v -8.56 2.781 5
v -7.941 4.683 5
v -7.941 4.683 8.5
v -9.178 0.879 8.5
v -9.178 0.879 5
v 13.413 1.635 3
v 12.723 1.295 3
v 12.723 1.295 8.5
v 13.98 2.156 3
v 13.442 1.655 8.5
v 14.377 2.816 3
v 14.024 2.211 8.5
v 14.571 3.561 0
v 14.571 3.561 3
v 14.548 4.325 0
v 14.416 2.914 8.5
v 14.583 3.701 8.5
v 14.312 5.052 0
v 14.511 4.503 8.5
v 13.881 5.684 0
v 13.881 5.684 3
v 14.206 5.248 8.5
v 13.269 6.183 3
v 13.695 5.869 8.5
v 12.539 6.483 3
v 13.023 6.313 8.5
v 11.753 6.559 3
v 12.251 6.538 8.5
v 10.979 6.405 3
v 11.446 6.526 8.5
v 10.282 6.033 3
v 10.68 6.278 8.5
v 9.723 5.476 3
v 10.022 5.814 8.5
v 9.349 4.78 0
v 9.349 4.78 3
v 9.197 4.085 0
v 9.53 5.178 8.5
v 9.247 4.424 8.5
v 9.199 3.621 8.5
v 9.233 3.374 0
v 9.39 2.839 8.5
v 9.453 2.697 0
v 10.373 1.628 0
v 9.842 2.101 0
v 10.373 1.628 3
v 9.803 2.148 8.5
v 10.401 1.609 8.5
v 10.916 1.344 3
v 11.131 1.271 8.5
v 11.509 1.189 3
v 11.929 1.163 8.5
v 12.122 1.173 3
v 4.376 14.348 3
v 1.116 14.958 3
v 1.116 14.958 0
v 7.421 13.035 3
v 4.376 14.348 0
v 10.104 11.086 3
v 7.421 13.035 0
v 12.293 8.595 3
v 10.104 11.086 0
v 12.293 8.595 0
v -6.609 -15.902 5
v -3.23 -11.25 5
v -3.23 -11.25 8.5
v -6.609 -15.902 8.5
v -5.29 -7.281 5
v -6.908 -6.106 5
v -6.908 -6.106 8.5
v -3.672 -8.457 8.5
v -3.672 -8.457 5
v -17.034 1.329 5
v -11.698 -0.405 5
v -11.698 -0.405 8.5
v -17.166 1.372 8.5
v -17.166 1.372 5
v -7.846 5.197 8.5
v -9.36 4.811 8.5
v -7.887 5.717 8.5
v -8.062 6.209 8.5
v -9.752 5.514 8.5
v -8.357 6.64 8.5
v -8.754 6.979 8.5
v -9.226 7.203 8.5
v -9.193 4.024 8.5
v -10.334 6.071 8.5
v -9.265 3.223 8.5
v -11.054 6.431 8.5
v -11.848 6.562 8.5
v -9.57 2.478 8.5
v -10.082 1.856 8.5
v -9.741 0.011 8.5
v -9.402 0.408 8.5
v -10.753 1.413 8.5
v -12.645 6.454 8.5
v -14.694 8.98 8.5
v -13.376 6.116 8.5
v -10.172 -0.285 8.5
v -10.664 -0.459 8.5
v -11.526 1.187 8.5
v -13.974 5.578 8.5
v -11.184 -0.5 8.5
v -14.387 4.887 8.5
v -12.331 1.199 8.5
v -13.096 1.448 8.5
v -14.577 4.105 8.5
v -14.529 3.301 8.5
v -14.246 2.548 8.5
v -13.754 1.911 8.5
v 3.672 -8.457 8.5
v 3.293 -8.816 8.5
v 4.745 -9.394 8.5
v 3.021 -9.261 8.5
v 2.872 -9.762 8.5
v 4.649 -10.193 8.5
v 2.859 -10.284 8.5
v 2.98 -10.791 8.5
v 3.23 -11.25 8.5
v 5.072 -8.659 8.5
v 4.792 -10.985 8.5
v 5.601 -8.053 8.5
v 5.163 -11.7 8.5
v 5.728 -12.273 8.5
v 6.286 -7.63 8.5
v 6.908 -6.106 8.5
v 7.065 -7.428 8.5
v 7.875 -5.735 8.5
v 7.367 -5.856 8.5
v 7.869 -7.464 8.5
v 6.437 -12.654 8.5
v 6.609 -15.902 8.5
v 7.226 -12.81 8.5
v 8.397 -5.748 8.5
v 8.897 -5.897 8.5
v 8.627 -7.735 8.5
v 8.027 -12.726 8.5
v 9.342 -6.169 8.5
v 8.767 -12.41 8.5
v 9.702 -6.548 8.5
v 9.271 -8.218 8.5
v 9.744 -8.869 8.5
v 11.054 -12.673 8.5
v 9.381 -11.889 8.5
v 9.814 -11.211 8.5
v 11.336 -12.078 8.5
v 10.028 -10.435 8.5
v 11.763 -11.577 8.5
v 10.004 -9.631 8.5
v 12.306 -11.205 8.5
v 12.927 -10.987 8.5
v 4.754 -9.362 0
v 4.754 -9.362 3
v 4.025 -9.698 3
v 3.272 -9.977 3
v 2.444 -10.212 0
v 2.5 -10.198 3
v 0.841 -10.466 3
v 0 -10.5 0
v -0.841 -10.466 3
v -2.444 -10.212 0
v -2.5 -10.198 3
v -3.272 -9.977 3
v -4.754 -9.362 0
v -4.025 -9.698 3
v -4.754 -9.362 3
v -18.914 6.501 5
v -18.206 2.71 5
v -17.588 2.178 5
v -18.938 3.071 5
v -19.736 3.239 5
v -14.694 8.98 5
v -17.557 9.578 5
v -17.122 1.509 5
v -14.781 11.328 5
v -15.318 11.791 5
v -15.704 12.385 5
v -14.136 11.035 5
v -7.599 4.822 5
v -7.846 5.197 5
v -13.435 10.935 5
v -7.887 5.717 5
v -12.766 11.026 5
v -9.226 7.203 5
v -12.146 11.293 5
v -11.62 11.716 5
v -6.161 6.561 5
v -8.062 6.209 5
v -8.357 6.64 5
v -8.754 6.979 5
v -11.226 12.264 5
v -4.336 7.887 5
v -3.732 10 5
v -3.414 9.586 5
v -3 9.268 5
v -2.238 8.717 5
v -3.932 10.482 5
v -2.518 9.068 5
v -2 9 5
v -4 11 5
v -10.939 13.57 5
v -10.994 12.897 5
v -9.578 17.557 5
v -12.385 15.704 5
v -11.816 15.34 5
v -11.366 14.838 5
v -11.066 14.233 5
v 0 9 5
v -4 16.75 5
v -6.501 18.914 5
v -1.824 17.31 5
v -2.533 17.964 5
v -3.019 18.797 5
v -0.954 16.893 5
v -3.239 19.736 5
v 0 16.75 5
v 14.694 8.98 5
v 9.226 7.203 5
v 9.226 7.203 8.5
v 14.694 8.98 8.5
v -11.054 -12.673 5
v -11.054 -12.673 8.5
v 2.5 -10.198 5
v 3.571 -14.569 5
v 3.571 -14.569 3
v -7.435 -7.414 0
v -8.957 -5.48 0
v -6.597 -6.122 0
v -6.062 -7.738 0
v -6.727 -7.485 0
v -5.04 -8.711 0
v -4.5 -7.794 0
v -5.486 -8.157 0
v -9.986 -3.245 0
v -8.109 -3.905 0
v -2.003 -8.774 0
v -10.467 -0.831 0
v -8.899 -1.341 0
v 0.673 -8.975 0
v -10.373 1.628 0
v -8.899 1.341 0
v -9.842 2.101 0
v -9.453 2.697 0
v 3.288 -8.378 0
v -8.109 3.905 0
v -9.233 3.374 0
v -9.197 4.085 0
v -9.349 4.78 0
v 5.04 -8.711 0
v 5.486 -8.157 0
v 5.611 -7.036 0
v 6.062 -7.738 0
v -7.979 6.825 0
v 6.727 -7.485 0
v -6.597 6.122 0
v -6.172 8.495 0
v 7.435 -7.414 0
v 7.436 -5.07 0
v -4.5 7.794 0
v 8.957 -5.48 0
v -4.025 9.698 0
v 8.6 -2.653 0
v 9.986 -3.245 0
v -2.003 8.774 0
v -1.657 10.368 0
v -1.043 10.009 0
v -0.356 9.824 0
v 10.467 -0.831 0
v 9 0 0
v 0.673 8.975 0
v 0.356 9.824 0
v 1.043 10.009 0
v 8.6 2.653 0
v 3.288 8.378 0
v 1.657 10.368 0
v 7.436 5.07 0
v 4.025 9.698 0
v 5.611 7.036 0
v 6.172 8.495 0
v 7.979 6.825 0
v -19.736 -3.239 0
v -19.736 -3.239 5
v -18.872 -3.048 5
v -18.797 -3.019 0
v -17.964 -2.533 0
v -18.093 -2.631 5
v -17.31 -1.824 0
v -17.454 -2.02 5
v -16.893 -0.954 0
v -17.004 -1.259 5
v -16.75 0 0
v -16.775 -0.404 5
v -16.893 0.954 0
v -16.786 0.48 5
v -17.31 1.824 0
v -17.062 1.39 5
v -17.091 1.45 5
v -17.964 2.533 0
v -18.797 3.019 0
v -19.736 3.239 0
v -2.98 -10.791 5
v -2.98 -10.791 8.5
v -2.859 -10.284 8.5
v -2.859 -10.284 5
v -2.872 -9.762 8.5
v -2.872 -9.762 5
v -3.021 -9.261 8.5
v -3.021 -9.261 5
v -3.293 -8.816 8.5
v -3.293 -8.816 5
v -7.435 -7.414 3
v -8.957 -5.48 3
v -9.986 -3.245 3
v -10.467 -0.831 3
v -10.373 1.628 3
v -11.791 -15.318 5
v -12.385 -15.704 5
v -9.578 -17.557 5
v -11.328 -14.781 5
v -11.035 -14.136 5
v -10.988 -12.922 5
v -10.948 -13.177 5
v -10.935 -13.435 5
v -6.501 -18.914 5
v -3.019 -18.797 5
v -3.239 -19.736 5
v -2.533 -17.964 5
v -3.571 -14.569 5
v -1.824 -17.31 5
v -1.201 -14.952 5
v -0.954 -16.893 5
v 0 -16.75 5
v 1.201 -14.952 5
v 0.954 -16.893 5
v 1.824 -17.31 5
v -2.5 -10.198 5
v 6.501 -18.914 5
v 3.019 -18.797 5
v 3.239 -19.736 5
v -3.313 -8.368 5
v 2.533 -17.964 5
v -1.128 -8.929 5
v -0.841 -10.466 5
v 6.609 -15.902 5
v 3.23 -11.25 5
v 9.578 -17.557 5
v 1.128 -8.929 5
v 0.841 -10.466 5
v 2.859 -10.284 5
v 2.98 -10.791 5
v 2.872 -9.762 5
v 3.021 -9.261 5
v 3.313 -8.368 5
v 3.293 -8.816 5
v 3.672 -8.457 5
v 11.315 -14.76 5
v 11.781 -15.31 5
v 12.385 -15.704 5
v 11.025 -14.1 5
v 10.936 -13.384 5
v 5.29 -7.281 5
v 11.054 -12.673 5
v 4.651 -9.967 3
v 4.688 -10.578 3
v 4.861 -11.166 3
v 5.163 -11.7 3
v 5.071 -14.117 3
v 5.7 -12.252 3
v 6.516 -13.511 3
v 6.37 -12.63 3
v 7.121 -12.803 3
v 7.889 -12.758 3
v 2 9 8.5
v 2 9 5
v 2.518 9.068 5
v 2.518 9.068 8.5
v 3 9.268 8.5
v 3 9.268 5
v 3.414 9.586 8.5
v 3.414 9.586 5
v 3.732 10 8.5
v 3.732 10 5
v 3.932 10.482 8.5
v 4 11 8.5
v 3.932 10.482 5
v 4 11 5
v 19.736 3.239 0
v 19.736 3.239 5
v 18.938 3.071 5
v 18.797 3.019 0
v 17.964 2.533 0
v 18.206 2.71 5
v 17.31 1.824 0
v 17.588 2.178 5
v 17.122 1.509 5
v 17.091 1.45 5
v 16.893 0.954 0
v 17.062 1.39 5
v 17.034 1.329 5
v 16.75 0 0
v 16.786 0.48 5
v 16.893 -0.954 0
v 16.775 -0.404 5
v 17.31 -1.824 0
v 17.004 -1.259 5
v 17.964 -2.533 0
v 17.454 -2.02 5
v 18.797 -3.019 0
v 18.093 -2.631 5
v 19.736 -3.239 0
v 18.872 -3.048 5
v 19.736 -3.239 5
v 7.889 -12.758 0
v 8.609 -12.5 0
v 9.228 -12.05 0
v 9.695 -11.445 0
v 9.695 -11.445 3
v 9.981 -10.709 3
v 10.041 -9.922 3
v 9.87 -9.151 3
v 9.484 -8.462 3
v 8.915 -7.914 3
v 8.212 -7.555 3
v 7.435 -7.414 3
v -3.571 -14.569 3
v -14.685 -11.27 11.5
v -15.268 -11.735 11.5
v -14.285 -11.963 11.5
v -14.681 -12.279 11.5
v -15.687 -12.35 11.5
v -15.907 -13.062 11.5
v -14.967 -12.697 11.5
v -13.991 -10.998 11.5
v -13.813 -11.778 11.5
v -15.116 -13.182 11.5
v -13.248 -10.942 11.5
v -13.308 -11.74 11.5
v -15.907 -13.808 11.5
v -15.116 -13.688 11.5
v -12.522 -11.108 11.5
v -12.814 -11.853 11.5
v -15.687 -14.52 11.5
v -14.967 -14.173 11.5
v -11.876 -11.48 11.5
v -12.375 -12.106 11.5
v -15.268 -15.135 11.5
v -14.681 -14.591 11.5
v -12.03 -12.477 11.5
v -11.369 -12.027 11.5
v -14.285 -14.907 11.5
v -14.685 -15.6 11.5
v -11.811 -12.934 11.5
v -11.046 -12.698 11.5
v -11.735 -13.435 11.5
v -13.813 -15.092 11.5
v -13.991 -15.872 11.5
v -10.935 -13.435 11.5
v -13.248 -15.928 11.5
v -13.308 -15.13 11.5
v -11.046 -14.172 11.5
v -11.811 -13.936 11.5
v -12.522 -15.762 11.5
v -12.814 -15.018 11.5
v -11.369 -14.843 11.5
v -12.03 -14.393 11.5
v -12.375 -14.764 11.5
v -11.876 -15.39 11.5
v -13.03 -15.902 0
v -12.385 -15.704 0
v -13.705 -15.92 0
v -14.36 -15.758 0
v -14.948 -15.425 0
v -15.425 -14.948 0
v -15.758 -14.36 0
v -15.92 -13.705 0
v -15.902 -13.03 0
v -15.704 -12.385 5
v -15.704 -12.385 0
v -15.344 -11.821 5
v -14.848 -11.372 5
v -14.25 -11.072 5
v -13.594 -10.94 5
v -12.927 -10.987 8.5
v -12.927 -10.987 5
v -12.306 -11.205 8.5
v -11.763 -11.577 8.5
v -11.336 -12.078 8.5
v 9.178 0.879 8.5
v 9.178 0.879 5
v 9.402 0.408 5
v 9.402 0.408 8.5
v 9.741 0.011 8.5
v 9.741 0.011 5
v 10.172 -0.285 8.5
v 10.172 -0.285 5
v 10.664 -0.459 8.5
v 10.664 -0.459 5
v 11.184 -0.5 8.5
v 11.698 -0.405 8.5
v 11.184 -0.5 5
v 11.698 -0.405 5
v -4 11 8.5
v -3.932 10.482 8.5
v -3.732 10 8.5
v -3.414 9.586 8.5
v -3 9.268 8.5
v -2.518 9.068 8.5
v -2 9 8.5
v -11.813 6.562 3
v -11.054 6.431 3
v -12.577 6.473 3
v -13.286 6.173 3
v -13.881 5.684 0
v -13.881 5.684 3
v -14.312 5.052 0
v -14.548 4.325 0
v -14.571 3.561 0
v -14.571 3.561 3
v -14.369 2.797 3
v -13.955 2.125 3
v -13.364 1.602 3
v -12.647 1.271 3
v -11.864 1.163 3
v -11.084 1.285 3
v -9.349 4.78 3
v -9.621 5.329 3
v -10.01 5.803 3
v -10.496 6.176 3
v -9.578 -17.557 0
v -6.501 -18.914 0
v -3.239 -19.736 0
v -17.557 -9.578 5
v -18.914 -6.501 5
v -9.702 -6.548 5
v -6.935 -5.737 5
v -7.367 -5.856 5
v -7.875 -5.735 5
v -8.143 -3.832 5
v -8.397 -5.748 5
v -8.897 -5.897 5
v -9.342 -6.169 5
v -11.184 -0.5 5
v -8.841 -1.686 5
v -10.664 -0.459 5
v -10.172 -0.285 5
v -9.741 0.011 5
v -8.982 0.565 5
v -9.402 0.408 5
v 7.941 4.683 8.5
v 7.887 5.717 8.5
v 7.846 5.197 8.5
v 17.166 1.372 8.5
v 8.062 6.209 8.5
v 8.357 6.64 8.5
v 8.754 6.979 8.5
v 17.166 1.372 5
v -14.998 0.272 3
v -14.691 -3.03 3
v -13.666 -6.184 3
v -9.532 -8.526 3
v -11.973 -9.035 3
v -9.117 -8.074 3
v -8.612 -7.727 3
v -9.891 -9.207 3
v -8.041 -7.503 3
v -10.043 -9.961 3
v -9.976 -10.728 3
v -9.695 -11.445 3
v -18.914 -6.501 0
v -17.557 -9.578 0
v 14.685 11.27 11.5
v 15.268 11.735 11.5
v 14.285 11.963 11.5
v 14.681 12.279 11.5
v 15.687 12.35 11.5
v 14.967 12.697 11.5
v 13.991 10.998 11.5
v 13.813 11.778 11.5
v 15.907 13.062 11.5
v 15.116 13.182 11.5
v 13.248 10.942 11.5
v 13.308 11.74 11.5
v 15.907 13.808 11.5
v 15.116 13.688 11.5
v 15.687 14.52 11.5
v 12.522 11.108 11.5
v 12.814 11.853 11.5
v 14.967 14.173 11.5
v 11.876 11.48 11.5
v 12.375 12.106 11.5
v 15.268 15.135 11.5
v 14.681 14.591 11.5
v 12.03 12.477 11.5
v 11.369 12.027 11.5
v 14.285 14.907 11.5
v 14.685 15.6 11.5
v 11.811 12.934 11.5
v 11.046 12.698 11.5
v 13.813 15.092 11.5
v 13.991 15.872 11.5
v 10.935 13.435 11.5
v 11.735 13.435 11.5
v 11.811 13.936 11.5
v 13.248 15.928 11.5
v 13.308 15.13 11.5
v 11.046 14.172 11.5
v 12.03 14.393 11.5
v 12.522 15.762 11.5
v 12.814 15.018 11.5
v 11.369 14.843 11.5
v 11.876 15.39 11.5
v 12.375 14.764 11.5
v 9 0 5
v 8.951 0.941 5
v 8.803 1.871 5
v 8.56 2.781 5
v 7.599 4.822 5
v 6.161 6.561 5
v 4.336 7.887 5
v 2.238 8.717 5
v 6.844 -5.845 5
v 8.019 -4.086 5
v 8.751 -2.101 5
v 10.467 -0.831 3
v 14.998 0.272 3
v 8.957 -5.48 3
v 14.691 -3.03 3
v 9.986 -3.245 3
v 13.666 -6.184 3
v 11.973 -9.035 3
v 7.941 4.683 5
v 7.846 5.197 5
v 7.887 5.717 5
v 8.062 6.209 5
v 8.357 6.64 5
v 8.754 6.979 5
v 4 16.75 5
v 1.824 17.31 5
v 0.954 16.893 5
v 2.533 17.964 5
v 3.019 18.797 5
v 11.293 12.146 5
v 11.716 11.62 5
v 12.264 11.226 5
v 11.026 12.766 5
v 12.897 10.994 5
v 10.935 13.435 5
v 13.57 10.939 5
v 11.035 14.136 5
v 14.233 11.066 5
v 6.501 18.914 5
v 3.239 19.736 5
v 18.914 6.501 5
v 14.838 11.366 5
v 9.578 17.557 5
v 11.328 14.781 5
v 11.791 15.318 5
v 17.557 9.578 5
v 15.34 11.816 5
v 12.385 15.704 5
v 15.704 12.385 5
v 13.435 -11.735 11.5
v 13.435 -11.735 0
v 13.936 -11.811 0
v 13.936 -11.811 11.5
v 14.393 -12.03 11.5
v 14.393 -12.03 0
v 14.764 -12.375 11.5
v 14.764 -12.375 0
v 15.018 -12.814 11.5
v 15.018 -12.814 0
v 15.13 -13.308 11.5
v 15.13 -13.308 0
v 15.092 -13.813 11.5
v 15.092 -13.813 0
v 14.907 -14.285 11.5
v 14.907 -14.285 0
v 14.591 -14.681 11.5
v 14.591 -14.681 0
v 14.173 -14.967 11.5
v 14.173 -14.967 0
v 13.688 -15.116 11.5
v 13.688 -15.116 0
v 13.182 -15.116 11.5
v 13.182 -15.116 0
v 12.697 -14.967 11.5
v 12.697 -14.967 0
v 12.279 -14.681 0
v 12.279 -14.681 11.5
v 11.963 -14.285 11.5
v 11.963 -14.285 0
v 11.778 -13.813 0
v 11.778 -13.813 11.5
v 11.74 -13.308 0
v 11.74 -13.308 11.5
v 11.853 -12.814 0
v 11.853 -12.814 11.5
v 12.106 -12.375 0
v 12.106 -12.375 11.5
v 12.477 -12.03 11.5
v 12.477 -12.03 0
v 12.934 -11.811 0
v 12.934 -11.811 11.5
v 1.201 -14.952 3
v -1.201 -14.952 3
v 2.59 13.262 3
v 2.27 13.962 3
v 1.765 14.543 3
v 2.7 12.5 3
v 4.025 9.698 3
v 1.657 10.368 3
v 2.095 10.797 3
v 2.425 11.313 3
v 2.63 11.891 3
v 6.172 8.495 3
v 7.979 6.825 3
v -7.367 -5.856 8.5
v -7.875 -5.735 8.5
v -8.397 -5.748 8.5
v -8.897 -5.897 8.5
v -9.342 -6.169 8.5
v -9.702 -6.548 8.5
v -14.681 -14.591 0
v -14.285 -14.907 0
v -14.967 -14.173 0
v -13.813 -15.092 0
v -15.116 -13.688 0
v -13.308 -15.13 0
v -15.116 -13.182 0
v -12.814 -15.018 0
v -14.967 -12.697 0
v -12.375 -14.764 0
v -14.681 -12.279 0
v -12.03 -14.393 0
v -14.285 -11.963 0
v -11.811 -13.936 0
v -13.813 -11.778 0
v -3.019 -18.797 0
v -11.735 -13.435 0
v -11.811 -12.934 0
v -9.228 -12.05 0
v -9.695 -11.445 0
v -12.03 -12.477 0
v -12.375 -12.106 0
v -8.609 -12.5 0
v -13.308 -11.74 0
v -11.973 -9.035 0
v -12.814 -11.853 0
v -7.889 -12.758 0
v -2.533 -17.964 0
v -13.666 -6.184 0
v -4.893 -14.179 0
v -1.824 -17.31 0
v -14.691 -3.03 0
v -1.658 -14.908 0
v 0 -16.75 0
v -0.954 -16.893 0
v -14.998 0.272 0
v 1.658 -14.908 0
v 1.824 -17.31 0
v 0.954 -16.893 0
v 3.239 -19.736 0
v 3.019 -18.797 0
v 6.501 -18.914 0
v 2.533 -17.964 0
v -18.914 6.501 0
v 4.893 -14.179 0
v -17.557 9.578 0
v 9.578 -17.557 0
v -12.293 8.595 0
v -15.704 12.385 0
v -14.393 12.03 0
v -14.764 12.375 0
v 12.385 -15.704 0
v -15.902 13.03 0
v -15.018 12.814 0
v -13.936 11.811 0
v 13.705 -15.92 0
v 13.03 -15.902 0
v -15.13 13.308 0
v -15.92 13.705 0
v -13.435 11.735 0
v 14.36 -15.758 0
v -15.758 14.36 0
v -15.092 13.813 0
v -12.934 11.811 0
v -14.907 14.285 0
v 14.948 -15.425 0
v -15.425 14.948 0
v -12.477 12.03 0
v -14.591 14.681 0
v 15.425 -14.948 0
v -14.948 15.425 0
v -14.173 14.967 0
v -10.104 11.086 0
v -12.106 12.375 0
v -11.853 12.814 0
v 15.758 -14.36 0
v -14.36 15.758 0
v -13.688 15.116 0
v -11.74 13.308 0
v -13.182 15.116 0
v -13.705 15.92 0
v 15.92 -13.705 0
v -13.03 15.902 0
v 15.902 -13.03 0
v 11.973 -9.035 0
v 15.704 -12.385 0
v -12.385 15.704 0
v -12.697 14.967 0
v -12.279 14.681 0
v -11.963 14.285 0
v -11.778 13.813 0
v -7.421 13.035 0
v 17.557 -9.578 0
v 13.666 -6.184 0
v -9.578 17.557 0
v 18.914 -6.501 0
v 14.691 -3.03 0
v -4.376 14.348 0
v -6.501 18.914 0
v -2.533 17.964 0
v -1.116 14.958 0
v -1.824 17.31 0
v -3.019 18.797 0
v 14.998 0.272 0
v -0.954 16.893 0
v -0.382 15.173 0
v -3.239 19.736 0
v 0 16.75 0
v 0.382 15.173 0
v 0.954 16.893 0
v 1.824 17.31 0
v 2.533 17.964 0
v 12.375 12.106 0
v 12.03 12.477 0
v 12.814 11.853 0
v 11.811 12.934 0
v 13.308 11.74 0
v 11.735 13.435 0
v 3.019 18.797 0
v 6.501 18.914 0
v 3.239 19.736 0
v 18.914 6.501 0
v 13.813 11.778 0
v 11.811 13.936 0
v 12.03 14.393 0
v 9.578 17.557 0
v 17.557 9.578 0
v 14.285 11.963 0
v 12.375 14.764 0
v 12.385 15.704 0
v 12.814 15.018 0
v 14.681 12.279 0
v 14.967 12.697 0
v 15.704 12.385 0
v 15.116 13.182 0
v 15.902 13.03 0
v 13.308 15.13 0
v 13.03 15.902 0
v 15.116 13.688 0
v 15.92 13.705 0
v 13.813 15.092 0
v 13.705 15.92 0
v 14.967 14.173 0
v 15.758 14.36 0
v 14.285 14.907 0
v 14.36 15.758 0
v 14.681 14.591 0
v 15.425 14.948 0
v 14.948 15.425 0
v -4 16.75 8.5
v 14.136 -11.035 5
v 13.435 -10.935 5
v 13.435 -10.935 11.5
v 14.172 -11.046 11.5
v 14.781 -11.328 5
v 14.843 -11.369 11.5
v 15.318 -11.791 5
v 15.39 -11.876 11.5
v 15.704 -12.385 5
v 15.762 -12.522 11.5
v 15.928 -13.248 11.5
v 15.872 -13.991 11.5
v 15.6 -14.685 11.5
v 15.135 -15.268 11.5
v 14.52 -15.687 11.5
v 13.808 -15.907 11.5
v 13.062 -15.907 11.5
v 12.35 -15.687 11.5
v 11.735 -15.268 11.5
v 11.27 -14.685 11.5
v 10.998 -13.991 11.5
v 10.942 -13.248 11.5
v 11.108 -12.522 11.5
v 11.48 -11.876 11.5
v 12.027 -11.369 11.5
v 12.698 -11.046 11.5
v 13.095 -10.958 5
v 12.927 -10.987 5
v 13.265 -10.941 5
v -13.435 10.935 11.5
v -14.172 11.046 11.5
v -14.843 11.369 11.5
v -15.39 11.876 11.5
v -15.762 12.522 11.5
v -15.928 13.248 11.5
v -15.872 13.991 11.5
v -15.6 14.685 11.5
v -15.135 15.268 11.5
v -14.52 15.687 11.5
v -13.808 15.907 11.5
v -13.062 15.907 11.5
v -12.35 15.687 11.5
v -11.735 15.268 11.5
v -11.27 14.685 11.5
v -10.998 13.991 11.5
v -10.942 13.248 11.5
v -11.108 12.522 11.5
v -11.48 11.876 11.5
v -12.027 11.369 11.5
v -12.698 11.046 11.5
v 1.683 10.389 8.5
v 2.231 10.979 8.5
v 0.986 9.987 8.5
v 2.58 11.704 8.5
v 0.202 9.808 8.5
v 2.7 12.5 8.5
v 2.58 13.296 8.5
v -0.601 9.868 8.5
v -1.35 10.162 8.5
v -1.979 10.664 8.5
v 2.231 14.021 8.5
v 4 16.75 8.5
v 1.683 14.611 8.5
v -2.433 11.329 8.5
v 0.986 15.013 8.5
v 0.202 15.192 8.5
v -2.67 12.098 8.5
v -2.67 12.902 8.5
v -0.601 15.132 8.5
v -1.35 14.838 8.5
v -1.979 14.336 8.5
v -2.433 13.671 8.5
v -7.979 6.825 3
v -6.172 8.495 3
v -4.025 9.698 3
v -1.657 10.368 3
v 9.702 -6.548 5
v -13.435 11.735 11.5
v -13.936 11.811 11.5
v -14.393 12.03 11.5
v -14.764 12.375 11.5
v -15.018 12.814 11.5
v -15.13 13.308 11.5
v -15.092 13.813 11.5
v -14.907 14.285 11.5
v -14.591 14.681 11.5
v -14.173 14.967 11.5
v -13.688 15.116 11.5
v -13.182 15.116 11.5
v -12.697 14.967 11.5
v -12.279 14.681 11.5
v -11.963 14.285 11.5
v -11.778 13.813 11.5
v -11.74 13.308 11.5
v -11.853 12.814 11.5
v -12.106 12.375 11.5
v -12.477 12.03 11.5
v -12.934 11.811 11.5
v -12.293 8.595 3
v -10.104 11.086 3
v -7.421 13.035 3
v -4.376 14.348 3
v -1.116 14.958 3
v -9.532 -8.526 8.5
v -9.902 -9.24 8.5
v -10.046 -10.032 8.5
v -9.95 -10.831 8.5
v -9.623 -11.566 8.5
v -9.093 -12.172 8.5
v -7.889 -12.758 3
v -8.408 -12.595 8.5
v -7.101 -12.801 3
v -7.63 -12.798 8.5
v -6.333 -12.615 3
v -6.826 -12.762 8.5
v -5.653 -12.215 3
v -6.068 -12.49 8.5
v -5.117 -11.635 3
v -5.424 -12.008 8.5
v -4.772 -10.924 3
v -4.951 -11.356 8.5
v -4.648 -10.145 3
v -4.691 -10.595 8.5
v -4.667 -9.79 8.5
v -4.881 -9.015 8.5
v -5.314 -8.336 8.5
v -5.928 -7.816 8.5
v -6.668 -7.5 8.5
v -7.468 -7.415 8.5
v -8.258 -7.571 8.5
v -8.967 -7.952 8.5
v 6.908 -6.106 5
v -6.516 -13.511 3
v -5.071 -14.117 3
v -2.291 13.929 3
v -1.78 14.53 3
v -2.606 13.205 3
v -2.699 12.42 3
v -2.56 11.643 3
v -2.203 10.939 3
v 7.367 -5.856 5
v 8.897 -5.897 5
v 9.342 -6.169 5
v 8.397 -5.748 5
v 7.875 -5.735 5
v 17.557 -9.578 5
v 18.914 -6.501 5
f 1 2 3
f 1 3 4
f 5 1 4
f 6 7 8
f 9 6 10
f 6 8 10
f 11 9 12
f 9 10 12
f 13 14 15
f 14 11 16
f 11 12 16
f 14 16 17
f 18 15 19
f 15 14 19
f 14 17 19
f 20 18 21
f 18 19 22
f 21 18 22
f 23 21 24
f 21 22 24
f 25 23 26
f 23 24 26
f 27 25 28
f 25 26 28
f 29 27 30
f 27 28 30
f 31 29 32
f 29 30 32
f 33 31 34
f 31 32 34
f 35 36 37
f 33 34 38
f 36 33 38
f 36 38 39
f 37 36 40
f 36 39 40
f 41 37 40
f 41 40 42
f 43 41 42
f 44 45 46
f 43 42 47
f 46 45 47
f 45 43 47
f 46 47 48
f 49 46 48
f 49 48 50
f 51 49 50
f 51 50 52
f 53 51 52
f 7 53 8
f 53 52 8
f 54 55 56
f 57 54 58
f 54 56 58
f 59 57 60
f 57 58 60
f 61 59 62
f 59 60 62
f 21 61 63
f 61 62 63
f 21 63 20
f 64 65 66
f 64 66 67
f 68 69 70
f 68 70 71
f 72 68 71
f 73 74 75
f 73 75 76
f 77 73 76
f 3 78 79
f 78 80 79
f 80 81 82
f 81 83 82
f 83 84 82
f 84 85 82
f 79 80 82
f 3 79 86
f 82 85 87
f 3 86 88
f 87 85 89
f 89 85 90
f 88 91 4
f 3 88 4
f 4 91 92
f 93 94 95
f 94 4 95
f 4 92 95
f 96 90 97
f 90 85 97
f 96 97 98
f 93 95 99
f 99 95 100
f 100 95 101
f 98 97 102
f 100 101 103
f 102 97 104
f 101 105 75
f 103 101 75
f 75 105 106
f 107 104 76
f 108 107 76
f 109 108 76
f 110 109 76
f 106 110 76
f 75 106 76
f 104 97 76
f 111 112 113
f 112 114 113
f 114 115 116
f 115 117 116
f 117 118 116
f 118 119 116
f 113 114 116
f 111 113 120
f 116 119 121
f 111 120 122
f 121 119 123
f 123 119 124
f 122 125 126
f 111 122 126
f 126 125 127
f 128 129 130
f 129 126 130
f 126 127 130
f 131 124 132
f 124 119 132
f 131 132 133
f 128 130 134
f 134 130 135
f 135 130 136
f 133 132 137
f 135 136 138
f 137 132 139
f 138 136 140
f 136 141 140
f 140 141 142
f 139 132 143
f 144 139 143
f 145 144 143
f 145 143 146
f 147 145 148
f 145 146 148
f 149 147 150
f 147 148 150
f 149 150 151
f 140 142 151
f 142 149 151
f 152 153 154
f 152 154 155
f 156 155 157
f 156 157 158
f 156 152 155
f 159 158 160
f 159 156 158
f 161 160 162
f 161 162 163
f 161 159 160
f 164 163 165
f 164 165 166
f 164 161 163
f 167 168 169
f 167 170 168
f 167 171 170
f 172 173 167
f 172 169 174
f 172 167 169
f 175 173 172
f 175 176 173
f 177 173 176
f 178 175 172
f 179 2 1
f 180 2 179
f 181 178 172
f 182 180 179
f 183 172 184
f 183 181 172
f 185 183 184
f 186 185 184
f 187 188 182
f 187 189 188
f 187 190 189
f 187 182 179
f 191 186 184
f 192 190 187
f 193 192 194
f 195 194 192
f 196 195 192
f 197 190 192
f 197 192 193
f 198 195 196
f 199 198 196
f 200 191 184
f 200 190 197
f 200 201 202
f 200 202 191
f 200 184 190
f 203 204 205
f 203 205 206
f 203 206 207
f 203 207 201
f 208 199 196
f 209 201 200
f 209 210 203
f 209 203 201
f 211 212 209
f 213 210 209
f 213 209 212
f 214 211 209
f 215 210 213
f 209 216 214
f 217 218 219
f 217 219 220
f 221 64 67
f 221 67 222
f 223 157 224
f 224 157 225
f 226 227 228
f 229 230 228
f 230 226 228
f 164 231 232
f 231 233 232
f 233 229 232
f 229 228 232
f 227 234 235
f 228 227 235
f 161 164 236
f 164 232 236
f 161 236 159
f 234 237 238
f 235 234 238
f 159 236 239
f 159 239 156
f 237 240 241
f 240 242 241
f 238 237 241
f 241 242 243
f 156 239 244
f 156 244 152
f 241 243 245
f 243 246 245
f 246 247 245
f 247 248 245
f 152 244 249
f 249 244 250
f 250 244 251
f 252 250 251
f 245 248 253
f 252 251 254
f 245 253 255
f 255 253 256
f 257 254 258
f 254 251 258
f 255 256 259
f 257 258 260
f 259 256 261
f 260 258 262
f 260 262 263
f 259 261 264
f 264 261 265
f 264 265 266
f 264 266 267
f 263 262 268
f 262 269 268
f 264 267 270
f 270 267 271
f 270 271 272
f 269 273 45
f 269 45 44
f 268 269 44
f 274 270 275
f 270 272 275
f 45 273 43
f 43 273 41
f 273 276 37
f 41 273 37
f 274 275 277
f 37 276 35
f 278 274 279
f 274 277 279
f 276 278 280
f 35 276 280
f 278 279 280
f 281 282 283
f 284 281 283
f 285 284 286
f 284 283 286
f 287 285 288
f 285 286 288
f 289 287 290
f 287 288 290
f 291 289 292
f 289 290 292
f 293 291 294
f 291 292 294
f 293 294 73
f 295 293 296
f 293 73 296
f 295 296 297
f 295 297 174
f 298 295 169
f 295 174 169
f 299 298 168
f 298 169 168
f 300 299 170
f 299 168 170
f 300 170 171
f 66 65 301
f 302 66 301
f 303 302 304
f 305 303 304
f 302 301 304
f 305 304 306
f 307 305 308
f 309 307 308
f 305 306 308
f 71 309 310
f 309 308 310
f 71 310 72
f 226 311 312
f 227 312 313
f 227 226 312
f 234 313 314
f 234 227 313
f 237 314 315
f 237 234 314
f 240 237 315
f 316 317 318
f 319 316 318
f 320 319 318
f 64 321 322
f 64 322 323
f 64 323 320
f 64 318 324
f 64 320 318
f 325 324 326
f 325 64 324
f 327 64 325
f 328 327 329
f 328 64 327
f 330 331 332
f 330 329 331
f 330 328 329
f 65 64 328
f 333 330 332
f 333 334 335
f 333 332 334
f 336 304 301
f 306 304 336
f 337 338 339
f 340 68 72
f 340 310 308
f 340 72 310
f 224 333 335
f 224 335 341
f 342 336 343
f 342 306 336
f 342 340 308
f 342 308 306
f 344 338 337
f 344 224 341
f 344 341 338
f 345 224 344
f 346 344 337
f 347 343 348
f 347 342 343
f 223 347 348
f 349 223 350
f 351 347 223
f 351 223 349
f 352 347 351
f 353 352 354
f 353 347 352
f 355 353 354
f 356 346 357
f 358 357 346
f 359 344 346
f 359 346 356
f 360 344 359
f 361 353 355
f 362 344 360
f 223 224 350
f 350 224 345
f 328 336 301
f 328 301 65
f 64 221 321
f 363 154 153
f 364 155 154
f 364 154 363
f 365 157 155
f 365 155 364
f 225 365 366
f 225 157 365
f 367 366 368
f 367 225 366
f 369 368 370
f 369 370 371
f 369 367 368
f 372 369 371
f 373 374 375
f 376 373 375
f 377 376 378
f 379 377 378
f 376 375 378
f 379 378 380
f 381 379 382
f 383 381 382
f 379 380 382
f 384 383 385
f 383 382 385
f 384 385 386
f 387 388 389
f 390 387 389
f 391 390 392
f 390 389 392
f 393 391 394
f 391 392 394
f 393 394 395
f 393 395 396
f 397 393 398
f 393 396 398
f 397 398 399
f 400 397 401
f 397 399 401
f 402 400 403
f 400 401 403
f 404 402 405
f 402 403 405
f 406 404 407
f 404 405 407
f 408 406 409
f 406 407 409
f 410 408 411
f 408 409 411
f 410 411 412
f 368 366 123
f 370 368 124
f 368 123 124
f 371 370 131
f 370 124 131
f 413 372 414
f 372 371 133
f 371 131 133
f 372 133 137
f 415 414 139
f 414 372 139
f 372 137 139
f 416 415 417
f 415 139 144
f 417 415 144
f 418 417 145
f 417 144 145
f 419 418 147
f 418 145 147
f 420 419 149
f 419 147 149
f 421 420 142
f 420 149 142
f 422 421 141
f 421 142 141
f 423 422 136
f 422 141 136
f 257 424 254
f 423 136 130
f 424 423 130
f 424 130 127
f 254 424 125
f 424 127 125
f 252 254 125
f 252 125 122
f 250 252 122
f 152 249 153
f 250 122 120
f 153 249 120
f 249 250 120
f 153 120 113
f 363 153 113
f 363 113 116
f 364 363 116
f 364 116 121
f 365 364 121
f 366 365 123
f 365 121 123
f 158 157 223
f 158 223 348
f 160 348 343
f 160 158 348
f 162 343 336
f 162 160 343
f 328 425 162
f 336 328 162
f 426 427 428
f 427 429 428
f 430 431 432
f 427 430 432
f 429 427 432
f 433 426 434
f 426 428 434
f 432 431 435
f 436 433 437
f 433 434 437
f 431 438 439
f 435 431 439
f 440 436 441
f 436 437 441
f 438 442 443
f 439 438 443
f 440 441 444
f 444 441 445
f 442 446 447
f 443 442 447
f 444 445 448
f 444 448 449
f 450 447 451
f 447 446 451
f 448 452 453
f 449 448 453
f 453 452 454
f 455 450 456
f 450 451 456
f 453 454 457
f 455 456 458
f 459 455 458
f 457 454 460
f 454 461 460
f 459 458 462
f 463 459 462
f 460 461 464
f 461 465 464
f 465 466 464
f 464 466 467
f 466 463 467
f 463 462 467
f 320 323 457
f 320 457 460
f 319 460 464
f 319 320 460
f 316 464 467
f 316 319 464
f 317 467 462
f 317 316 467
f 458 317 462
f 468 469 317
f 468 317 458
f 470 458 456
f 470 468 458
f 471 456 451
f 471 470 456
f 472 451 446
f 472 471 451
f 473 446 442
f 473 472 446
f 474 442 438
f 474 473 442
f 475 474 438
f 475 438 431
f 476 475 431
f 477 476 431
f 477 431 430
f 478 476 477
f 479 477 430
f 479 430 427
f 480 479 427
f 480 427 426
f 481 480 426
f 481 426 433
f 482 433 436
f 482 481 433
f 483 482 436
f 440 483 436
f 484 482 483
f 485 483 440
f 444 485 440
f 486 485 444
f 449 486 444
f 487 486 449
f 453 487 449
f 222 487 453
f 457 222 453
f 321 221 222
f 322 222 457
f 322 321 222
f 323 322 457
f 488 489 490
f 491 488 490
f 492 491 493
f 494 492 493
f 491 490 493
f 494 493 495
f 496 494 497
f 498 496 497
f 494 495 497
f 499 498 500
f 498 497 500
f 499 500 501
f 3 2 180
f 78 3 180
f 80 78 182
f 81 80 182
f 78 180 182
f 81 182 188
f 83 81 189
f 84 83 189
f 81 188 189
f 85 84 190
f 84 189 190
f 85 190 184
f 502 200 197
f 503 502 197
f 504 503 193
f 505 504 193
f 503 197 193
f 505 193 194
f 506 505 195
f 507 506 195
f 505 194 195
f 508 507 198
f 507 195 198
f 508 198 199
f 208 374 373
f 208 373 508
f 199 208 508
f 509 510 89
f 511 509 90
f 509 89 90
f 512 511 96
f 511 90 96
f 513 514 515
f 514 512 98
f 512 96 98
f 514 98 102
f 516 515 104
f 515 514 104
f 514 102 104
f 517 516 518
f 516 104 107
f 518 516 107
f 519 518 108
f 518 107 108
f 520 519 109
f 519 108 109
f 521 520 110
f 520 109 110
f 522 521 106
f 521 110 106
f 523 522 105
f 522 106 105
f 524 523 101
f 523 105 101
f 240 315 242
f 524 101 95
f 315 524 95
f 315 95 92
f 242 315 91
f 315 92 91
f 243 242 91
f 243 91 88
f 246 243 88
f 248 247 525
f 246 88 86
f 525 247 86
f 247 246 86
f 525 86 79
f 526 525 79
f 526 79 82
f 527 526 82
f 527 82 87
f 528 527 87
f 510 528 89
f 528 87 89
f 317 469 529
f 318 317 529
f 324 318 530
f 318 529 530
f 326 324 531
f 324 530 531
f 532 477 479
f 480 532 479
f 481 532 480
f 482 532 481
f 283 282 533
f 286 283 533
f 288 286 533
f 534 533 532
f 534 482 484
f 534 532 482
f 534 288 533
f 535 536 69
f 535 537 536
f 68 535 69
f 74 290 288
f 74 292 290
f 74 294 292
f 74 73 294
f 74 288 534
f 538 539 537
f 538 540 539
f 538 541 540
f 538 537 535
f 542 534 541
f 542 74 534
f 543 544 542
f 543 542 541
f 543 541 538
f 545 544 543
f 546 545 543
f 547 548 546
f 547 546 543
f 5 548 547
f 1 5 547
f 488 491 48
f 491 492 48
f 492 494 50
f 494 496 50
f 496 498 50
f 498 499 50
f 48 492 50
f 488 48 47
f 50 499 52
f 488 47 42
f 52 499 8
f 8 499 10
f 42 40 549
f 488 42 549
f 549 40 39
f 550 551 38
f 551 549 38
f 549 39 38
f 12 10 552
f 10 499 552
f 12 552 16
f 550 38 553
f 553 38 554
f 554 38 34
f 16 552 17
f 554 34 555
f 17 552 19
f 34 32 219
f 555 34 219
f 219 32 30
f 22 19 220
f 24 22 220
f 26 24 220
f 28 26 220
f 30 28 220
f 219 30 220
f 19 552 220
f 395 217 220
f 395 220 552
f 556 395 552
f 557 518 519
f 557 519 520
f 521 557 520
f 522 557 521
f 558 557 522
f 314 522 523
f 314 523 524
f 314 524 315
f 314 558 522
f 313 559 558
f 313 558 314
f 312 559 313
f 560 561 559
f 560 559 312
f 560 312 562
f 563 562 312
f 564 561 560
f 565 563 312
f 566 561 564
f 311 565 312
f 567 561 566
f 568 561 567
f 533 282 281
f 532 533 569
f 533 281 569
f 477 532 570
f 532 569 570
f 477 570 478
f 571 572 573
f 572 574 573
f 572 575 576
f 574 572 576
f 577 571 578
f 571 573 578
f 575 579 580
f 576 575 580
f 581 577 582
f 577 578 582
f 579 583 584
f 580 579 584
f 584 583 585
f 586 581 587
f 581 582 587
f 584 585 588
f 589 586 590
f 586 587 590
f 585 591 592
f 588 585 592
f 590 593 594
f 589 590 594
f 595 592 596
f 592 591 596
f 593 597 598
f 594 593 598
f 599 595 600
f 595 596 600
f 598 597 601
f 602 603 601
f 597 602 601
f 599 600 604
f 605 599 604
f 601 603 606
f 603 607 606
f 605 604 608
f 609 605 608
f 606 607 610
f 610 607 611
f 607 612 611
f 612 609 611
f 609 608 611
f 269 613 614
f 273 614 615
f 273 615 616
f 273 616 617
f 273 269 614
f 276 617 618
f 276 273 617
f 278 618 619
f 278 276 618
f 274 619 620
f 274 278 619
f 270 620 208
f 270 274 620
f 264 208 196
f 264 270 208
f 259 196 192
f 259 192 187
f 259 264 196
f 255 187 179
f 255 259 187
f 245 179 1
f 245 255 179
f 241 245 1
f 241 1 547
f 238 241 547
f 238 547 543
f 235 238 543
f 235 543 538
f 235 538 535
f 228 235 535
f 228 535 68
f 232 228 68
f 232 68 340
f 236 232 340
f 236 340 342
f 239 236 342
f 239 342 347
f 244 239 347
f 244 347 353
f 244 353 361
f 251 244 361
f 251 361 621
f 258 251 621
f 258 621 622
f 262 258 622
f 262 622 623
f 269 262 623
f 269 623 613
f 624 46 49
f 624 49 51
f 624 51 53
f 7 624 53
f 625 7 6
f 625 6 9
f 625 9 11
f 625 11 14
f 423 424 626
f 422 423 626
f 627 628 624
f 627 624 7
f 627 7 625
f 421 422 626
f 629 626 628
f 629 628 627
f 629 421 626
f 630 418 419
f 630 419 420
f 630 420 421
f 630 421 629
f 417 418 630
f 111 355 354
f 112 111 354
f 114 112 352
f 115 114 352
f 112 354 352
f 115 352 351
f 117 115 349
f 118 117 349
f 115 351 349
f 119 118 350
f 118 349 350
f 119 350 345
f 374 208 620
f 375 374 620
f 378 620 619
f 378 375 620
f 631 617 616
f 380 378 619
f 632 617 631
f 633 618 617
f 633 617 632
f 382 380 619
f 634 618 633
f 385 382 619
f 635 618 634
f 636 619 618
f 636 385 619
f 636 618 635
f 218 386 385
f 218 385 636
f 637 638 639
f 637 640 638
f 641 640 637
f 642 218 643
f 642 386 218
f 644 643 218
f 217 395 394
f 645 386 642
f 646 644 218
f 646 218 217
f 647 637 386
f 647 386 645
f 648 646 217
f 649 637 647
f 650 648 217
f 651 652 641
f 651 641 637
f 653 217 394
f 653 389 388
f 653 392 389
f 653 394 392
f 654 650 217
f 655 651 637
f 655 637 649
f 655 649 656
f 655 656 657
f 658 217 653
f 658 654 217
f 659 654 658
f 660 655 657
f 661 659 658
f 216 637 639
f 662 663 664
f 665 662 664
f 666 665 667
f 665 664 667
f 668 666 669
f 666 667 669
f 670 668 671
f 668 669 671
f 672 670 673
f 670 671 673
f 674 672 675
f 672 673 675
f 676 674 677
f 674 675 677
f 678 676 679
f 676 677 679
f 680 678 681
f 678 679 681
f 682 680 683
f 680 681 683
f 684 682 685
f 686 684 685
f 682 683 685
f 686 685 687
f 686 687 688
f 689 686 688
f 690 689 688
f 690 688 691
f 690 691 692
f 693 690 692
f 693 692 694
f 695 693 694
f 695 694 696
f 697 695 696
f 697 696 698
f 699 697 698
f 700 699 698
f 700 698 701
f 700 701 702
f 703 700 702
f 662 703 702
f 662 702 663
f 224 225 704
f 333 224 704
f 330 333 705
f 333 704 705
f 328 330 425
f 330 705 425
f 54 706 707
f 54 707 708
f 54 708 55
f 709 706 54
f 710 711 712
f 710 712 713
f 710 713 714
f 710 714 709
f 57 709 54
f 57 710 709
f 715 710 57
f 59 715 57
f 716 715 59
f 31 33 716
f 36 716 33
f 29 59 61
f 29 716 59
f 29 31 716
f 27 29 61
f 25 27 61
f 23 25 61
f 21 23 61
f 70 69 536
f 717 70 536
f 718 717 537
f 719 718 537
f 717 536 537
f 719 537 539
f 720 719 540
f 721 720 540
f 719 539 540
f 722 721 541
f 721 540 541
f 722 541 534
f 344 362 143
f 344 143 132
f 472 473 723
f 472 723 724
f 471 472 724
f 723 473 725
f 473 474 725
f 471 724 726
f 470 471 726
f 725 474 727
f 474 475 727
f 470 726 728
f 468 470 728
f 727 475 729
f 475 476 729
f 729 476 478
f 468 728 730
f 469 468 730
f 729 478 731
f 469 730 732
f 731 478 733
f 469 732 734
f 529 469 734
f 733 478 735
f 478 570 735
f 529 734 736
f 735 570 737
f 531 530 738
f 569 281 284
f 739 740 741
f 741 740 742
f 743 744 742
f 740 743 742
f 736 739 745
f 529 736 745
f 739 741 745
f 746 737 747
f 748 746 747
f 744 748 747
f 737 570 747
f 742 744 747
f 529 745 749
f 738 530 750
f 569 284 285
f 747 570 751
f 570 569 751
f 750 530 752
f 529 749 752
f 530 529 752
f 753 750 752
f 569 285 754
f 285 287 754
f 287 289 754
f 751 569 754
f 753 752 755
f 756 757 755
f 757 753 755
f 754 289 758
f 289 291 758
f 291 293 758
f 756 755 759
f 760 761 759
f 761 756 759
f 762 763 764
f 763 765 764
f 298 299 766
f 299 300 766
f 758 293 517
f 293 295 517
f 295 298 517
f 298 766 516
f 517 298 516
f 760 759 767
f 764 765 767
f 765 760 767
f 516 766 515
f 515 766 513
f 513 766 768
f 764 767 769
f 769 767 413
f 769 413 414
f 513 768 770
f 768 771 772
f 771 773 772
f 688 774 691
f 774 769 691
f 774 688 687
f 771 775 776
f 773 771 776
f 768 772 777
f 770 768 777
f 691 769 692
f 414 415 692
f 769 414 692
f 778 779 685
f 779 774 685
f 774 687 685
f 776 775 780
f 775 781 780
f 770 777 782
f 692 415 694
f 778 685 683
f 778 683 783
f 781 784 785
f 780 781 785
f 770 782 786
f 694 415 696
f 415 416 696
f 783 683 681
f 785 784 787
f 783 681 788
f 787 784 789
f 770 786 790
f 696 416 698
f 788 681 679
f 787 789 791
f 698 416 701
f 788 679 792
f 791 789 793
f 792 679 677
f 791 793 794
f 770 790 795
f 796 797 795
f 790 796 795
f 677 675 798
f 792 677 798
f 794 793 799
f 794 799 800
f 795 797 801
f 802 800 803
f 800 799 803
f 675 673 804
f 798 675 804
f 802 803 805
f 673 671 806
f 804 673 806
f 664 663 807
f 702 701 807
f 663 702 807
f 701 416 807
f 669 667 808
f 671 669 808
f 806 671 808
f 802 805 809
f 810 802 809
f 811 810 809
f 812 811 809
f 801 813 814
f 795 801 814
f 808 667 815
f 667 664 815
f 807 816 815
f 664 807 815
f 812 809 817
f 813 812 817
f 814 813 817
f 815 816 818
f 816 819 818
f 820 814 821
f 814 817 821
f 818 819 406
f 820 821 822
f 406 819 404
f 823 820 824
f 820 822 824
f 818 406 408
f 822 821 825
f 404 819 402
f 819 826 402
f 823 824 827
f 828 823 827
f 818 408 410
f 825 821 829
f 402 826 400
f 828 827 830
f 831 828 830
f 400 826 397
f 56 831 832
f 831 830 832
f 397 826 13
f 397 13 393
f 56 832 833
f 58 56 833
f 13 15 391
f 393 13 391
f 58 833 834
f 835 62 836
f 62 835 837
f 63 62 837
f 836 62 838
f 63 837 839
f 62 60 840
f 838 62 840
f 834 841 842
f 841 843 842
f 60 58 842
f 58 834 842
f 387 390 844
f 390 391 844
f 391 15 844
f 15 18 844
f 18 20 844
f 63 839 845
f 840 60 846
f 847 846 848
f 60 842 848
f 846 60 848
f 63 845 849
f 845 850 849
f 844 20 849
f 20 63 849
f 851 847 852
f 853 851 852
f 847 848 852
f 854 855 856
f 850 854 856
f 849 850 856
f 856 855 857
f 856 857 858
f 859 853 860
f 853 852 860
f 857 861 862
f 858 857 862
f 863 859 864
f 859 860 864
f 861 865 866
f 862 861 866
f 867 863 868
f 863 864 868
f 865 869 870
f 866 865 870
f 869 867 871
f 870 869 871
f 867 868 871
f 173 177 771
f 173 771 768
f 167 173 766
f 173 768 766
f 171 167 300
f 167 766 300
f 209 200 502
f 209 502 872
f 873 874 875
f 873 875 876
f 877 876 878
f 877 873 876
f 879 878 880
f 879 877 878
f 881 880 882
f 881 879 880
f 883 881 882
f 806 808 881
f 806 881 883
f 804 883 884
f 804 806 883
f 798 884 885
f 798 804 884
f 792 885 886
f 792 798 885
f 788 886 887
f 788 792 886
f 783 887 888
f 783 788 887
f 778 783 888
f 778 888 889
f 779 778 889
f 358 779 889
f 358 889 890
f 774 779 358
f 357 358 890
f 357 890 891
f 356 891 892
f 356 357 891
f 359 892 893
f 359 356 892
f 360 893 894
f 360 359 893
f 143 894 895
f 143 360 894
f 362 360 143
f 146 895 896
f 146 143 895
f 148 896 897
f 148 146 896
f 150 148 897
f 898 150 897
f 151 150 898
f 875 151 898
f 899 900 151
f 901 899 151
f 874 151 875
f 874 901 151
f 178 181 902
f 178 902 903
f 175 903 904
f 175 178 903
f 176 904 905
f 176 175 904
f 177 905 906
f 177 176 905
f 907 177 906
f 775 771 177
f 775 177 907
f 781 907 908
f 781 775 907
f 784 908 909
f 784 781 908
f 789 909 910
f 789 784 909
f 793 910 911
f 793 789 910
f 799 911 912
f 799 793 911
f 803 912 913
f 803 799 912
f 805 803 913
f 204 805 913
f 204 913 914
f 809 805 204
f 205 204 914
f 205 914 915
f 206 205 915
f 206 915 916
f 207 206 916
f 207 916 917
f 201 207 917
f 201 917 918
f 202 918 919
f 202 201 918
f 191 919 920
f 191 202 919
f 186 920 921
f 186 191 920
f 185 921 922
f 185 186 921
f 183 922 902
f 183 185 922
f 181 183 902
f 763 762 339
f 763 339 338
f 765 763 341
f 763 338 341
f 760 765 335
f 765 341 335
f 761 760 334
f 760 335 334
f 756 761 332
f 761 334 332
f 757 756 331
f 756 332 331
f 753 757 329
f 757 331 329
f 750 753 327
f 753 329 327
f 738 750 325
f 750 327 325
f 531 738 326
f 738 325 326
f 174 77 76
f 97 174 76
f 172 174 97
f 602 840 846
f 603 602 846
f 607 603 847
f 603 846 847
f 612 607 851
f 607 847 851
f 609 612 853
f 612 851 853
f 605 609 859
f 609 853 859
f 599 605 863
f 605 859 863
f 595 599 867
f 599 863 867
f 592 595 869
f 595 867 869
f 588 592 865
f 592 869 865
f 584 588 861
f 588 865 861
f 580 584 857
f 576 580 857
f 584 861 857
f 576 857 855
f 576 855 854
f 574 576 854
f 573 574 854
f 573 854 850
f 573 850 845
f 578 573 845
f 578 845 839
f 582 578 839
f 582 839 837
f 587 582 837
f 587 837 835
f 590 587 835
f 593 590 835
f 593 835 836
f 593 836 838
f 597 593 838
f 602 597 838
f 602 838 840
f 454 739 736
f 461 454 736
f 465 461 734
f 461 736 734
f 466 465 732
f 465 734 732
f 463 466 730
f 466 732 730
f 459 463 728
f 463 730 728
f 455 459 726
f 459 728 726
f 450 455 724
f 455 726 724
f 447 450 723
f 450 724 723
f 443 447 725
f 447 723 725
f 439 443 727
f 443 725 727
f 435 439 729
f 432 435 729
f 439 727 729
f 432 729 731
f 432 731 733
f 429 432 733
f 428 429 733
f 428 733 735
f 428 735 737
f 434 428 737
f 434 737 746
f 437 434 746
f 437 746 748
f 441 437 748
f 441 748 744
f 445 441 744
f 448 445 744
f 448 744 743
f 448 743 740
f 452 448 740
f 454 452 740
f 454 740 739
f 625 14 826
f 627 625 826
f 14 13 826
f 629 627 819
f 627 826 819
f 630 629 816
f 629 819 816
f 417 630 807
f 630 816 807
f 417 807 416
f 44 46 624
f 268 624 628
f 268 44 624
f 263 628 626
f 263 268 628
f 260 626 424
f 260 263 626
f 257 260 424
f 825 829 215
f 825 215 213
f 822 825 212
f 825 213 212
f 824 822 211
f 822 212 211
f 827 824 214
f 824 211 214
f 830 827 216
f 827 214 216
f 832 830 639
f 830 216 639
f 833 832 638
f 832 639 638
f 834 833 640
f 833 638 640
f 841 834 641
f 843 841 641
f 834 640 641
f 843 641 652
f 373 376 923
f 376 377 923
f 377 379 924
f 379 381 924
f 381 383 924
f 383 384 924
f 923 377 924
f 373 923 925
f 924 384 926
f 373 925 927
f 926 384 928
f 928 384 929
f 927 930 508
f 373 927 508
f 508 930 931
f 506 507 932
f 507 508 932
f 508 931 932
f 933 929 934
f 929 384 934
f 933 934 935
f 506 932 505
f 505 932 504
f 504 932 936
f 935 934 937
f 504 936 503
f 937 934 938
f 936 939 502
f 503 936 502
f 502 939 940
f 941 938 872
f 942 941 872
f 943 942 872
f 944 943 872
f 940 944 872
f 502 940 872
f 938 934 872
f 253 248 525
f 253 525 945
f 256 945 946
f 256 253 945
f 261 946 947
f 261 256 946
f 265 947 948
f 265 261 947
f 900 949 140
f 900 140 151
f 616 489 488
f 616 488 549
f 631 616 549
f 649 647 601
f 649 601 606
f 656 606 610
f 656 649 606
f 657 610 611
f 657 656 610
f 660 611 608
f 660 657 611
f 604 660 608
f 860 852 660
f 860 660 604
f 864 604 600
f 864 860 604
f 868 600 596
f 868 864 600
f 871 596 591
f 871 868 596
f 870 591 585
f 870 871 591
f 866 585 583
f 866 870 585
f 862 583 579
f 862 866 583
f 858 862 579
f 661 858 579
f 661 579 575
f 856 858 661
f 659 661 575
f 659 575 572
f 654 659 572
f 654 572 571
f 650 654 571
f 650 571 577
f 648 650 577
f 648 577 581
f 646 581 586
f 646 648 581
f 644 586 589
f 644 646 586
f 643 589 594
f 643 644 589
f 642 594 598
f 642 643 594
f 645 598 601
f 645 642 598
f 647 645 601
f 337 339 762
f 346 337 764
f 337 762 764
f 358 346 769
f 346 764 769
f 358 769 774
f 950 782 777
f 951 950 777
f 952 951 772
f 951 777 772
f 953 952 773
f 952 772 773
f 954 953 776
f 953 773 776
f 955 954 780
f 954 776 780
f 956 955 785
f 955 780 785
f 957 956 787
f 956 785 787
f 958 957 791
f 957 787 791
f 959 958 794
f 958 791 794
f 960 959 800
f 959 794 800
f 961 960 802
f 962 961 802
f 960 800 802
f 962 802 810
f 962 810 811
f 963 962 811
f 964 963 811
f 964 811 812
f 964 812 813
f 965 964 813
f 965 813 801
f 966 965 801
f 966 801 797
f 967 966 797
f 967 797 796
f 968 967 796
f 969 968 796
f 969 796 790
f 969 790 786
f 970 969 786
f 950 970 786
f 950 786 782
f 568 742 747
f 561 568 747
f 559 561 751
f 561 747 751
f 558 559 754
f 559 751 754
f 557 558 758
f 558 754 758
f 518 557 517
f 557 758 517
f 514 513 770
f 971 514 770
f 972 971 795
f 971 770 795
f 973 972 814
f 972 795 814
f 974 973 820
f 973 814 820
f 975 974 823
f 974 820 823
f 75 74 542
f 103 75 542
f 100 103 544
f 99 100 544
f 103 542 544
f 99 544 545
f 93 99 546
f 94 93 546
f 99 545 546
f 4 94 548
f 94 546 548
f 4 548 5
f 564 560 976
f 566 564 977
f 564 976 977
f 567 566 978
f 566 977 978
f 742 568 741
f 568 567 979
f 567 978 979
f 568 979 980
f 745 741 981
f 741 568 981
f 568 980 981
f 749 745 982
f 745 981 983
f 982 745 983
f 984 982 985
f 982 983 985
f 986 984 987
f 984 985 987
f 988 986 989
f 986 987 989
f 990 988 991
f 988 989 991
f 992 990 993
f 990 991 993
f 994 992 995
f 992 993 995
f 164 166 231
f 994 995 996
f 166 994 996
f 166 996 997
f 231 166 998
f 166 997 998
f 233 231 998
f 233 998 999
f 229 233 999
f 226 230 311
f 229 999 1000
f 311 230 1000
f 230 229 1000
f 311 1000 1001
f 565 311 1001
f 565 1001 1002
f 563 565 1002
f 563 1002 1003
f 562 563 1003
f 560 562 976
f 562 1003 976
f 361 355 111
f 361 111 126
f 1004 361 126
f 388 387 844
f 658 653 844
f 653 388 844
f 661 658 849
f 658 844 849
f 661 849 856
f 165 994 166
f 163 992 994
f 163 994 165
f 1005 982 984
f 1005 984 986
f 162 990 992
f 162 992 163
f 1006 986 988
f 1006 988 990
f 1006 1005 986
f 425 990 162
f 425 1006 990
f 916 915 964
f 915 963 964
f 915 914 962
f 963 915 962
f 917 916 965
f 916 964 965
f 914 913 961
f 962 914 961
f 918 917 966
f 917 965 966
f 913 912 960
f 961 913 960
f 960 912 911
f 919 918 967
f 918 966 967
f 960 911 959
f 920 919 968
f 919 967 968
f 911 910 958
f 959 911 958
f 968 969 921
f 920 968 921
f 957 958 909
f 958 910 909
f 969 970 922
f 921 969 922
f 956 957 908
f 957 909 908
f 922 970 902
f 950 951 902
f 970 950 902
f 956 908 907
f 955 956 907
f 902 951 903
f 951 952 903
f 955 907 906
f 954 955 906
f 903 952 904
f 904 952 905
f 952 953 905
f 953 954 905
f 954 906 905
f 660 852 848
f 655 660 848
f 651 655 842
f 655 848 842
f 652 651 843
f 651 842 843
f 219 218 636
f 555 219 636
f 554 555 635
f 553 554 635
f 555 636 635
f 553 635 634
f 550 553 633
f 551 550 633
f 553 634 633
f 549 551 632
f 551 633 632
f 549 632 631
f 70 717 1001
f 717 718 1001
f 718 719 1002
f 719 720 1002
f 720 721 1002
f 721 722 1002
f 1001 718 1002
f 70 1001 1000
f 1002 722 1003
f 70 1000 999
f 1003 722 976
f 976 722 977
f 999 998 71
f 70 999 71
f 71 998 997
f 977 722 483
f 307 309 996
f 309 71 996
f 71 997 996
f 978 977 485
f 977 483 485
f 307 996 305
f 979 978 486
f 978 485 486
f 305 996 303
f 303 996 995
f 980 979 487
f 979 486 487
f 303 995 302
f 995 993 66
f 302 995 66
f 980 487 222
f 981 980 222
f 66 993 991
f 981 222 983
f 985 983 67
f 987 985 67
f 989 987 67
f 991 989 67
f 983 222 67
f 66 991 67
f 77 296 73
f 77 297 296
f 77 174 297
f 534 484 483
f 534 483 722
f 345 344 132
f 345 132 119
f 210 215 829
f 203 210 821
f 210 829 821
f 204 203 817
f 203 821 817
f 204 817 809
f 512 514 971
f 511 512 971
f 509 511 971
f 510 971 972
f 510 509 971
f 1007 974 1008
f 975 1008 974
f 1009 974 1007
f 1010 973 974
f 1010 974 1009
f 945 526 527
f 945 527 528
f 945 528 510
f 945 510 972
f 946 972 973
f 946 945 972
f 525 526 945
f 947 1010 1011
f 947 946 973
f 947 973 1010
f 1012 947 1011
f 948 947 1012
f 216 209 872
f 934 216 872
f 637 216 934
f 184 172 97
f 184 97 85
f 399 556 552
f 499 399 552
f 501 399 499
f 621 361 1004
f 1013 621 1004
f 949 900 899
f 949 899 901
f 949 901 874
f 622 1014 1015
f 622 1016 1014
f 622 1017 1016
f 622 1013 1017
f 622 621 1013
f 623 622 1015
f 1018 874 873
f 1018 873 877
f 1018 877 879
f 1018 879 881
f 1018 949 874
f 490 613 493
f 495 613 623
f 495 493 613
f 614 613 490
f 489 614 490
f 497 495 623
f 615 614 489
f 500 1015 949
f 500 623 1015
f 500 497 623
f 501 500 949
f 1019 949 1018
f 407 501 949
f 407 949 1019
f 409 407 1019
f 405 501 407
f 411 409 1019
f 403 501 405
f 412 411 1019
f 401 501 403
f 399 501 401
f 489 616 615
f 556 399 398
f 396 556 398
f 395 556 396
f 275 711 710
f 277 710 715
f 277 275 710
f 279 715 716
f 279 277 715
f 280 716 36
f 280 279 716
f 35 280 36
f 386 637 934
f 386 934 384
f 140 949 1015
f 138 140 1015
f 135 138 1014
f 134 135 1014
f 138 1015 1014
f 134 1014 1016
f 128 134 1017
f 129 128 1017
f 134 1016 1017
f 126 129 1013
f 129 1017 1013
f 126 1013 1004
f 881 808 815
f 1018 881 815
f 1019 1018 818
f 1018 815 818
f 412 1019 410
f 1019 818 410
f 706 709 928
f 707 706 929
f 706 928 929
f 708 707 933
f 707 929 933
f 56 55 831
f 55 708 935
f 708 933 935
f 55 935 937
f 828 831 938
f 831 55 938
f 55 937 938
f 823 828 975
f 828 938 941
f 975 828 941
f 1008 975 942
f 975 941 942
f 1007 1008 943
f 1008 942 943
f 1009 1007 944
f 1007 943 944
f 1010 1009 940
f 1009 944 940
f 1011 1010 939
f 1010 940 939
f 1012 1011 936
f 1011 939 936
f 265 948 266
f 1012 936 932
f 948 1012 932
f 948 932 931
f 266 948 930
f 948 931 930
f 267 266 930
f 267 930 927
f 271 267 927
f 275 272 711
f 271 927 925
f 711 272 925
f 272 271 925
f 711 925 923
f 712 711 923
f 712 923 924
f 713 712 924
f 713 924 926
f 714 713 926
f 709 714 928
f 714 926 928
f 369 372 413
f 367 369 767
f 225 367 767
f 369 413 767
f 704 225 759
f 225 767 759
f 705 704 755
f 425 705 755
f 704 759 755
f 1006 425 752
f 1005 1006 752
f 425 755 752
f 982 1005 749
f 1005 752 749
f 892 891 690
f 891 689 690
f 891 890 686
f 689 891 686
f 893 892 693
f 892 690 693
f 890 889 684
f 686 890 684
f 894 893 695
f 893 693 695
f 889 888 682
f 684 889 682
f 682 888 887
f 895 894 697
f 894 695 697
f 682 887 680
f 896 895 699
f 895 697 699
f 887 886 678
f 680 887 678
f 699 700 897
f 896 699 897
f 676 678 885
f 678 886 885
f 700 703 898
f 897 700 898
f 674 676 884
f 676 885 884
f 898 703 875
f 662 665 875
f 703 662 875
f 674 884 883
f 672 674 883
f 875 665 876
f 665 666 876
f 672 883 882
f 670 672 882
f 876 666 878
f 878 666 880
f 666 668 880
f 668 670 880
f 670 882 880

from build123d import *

# Parameters (mm, degrees)
SKETCH_R              = 20
SKETCH_R_2            = 9
PAD_DEPTH             = 5
POCKET_DEPTH          = 5
POLARPATTERN_COUNT    = 4
PAD001_DEPTH          = 3.5
POLARPATTERN001_COUNT = 5
SKETCH003_R           = 2.7
POCKET001_DEPTH       = 121.431206
POLARPATTERN002_COUNT = 5
SKETCH004_R           = 15
SKETCH004_R_2         = 10.5
POCKET002_DEPTH       = 3
POCKET003_DEPTH       = 5.501
SKETCH006_R           = 2.5
PAD002_DEPTH          = 11.5
POLARPATTERN003_COUNT = 4
SKETCH007_R           = 1.7
POCKET004_DEPTH       = 125.488856
POLARPATTERN004_COUNT = 4


with BuildPart() as part:
    # Sketch → Pad (new body)
    with BuildSketch(Plane.XY):
        Circle(SKETCH_R)
        Circle(SKETCH_R_2, mode=Mode.SUBTRACT)
    extrude(amount=PAD_DEPTH)

    # Sketch001 → Pocket (cut)
    with BuildSketch(Plane.XY.offset(5)):
        with BuildLine():
            Line((3.25, 20), (-3.25, 20))
            ThreePointArc((-3.25, 20), (0, 16.75), (3.25, 20))
        make_face()
    pocket = extrude(amount=-POCKET_DEPTH, mode=Mode.SUBTRACT)

    # PolarPattern: Pocket ×4 about axis
    polarpattern_axis = Axis((0, 0, 5), (0, 0, 1))
    for i in range(1, POLARPATTERN_COUNT):
        add(pocket.rotate(polarpattern_axis, i * 360 / POLARPATTERN_COUNT), mode=Mode.SUBTRACT)

    # Sketch002 → Pad001 (new body)
    with BuildSketch(Plane.XY.offset(5)):
        with BuildLine():
            Line((-4, 16.75), (4, 16.75))
            Line((4, 16.75), (4, 11))
            ThreePointArc((2, 9), (3.414214, 9.585786), (4, 11))
            Line((2, 9), (-2, 9))
            ThreePointArc((-4, 11), (-3.414214, 9.585786), (-2, 9))
            Line((-4, 11), (-4, 16.75))
        make_face()
    pad001 = extrude(amount=PAD001_DEPTH)

    # PolarPattern001: Pad001 ×5 about axis
    polarpattern001_axis = Axis((0, 0, 5), (0, 0, 1))
    for i in range(1, POLARPATTERN001_COUNT):
        add(pad001.rotate(polarpattern001_axis, i * 360 / POLARPATTERN001_COUNT))

    # Sketch003 → Pocket001 (cut, through all)
    with BuildSketch(Plane.XY.offset(8.5)):
        with Locations((0, 12.5)):
            Circle(SKETCH003_R)
    pocket001 = extrude(amount=-POCKET001_DEPTH, mode=Mode.SUBTRACT)

    # PolarPattern002: Pocket001 ×5 about axis
    polarpattern002_axis = Axis((0, 0, 8.5), (0, 0, 1))
    for i in range(1, POLARPATTERN002_COUNT):
        add(pocket001.rotate(polarpattern002_axis, i * 360 / POLARPATTERN002_COUNT), mode=Mode.SUBTRACT)

    # Sketch004 → Pocket002 (cut)
    with BuildSketch(Plane(origin=(0, 0, 0), x_dir=(1, 0, 0), z_dir=(0, 0, -1))):
        Circle(SKETCH004_R)
        Circle(SKETCH004_R_2, mode=Mode.SUBTRACT)
    extrude(amount=-POCKET002_DEPTH, mode=Mode.SUBTRACT)

    # Sketch005 → Pocket003 (cut, through all)
    with BuildSketch(Plane(origin=(0, 0, 3), x_dir=(1, 0, 0), z_dir=(0, 0, -1))):
        with BuildLine():
            ThreePointArc((2.5, 10.198039), (0, 10.5), (-2.5, 10.198039))
            Line((-3.571429, 14.568627), (-2.5, 10.198039))
            ThreePointArc((3.571429, 14.568627), (0, 15), (-3.571429, 14.568627))
            Line((2.5, 10.198039), (3.571429, 14.568627))
        make_face()
    extrude(amount=-POCKET003_DEPTH, mode=Mode.SUBTRACT)

    # Sketch006 → Pad002 (new body)
    with BuildSketch(Plane(origin=(0, 0, 0), x_dir=(1, 0, 0), z_dir=(0, 0, -1))):
        with Locations((-13.435029, 13.435029)):
            Circle(SKETCH006_R)
    pad002 = extrude(amount=-PAD002_DEPTH)

    # PolarPattern003: Pad002 ×4 about axis
    polarpattern003_axis = Axis((0, 0, 0), (0, 0, -1))
    for i in range(1, POLARPATTERN003_COUNT):
        add(pad002.rotate(polarpattern003_axis, i * 360 / POLARPATTERN003_COUNT))

    # Sketch007 → Pocket004 (cut, through all)
    with BuildSketch(Plane(origin=(0, 0, 0), x_dir=(1, 0, 0), z_dir=(0, 0, -1))):
        with Locations((-13.435029, 13.435029)):
            Circle(SKETCH007_R)
    pocket004 = extrude(amount=-POCKET004_DEPTH, mode=Mode.SUBTRACT)

    # PolarPattern004: Pocket004 ×4 about axis
    polarpattern004_axis = Axis((0, 0, 0), (0, 0, -1))
    for i in range(1, POLARPATTERN004_COUNT):
        add(pocket004.rotate(polarpattern004_axis, i * 360 / POLARPATTERN004_COUNT), mode=Mode.SUBTRACT)


solid = part.part
